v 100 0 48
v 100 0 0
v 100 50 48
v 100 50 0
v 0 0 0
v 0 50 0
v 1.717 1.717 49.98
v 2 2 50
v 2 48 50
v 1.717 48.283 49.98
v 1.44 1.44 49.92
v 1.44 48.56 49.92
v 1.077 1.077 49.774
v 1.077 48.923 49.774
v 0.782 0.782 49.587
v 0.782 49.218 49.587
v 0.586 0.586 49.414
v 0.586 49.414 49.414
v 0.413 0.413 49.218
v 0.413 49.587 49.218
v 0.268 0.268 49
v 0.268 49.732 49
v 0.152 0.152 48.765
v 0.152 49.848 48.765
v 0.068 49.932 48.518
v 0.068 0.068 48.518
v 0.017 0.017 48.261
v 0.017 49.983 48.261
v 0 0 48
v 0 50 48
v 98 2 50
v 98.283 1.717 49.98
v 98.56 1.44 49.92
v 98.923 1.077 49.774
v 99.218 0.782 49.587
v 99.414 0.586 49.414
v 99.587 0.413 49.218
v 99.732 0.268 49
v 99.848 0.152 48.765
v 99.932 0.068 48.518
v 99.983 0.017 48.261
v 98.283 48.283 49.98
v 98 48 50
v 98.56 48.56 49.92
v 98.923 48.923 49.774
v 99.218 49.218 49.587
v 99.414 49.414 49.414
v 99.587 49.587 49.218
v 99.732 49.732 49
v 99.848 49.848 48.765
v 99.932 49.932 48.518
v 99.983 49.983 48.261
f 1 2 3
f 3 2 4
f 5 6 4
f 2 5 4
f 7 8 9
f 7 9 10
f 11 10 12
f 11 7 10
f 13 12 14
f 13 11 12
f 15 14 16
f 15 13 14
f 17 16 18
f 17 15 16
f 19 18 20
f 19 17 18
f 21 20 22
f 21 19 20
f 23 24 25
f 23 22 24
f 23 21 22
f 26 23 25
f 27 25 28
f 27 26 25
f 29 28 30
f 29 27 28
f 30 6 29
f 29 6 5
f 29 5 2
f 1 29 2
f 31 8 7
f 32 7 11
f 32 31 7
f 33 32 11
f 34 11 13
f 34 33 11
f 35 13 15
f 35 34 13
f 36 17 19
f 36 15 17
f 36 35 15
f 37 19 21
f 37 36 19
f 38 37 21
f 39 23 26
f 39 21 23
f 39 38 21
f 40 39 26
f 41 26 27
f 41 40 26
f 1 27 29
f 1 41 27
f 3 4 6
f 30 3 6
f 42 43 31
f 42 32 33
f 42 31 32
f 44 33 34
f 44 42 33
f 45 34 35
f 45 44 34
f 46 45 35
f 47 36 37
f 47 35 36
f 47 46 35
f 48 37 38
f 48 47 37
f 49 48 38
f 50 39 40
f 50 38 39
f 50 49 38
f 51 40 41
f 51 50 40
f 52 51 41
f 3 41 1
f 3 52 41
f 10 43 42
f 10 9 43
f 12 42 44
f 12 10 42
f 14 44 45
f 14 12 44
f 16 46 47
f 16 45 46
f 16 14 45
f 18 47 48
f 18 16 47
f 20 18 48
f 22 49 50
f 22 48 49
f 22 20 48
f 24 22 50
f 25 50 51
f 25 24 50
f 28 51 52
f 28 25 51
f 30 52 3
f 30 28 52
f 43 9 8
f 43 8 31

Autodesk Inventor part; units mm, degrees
ref_plane "YZ Plane" through (0, 0, 0) normal (1, 0, 0) x (0, 1, 0)
ref_plane "XZ Plane" through (0, 0, 0) normal (0, 1, 0) x (-1, 0, 0)
ref_plane "XY Plane" through (0, 0, 0) normal (0, 0, 1) x (1, 0, 0)
sketch "Sketch1" plane through (0, 0, 0) normal (0, 0, 1) x (1, 0, 0)
  point P0 (0, 0)
sketch "Sketch2" plane through (0, 0, 0) normal (0, 0, 1) x (1, 0, 0)
  line L0 (0, 0) -> (100, 0)
  line L1 (100, 0) -> (100, 50)
  line L2 (100, 50) -> (0, 50)
  line L3 (0, 50) -> (0, 0)
  dimension "d0" = 100
  dimension "d1" = 50
extrude "Extrusion1" add sketch "Sketch2" along normal blind 50
sketch "Sketch3" plane through (0, 0, 50) normal (0, 0, 1) x (1, 0, 0)
  line L0 (55.2555, 31.9048) -> (75.8524, 31.9048) construction
  line L1 (75.8524, 31.9048) -> (75.8524, 16.4463) construction
  line L2 (75.8524, 16.4463) -> (55.2555, 16.4463) construction
  line L3 (55.2555, 16.4463) -> (55.2555, 31.9048) construction
  line L4 (14.2136, 34.7413) -> (46.5855, 34.7413) construction
  line L5 (46.5855, 34.7413) -> (46.5855, 13.7217) construction
  line L6 (46.5855, 13.7217) -> (14.2136, 13.7217) construction
  line L7 (14.2136, 13.7217) -> (14.2136, 34.7413) construction
  point P0 (0, 0)
fillet "Fillet2" radius 2 4 edges at (0, 25, 50) (50, 50, 50) (50, 0, 50) (100, 25, 50)
properties part number "caja" material "Steel, Wrought"
